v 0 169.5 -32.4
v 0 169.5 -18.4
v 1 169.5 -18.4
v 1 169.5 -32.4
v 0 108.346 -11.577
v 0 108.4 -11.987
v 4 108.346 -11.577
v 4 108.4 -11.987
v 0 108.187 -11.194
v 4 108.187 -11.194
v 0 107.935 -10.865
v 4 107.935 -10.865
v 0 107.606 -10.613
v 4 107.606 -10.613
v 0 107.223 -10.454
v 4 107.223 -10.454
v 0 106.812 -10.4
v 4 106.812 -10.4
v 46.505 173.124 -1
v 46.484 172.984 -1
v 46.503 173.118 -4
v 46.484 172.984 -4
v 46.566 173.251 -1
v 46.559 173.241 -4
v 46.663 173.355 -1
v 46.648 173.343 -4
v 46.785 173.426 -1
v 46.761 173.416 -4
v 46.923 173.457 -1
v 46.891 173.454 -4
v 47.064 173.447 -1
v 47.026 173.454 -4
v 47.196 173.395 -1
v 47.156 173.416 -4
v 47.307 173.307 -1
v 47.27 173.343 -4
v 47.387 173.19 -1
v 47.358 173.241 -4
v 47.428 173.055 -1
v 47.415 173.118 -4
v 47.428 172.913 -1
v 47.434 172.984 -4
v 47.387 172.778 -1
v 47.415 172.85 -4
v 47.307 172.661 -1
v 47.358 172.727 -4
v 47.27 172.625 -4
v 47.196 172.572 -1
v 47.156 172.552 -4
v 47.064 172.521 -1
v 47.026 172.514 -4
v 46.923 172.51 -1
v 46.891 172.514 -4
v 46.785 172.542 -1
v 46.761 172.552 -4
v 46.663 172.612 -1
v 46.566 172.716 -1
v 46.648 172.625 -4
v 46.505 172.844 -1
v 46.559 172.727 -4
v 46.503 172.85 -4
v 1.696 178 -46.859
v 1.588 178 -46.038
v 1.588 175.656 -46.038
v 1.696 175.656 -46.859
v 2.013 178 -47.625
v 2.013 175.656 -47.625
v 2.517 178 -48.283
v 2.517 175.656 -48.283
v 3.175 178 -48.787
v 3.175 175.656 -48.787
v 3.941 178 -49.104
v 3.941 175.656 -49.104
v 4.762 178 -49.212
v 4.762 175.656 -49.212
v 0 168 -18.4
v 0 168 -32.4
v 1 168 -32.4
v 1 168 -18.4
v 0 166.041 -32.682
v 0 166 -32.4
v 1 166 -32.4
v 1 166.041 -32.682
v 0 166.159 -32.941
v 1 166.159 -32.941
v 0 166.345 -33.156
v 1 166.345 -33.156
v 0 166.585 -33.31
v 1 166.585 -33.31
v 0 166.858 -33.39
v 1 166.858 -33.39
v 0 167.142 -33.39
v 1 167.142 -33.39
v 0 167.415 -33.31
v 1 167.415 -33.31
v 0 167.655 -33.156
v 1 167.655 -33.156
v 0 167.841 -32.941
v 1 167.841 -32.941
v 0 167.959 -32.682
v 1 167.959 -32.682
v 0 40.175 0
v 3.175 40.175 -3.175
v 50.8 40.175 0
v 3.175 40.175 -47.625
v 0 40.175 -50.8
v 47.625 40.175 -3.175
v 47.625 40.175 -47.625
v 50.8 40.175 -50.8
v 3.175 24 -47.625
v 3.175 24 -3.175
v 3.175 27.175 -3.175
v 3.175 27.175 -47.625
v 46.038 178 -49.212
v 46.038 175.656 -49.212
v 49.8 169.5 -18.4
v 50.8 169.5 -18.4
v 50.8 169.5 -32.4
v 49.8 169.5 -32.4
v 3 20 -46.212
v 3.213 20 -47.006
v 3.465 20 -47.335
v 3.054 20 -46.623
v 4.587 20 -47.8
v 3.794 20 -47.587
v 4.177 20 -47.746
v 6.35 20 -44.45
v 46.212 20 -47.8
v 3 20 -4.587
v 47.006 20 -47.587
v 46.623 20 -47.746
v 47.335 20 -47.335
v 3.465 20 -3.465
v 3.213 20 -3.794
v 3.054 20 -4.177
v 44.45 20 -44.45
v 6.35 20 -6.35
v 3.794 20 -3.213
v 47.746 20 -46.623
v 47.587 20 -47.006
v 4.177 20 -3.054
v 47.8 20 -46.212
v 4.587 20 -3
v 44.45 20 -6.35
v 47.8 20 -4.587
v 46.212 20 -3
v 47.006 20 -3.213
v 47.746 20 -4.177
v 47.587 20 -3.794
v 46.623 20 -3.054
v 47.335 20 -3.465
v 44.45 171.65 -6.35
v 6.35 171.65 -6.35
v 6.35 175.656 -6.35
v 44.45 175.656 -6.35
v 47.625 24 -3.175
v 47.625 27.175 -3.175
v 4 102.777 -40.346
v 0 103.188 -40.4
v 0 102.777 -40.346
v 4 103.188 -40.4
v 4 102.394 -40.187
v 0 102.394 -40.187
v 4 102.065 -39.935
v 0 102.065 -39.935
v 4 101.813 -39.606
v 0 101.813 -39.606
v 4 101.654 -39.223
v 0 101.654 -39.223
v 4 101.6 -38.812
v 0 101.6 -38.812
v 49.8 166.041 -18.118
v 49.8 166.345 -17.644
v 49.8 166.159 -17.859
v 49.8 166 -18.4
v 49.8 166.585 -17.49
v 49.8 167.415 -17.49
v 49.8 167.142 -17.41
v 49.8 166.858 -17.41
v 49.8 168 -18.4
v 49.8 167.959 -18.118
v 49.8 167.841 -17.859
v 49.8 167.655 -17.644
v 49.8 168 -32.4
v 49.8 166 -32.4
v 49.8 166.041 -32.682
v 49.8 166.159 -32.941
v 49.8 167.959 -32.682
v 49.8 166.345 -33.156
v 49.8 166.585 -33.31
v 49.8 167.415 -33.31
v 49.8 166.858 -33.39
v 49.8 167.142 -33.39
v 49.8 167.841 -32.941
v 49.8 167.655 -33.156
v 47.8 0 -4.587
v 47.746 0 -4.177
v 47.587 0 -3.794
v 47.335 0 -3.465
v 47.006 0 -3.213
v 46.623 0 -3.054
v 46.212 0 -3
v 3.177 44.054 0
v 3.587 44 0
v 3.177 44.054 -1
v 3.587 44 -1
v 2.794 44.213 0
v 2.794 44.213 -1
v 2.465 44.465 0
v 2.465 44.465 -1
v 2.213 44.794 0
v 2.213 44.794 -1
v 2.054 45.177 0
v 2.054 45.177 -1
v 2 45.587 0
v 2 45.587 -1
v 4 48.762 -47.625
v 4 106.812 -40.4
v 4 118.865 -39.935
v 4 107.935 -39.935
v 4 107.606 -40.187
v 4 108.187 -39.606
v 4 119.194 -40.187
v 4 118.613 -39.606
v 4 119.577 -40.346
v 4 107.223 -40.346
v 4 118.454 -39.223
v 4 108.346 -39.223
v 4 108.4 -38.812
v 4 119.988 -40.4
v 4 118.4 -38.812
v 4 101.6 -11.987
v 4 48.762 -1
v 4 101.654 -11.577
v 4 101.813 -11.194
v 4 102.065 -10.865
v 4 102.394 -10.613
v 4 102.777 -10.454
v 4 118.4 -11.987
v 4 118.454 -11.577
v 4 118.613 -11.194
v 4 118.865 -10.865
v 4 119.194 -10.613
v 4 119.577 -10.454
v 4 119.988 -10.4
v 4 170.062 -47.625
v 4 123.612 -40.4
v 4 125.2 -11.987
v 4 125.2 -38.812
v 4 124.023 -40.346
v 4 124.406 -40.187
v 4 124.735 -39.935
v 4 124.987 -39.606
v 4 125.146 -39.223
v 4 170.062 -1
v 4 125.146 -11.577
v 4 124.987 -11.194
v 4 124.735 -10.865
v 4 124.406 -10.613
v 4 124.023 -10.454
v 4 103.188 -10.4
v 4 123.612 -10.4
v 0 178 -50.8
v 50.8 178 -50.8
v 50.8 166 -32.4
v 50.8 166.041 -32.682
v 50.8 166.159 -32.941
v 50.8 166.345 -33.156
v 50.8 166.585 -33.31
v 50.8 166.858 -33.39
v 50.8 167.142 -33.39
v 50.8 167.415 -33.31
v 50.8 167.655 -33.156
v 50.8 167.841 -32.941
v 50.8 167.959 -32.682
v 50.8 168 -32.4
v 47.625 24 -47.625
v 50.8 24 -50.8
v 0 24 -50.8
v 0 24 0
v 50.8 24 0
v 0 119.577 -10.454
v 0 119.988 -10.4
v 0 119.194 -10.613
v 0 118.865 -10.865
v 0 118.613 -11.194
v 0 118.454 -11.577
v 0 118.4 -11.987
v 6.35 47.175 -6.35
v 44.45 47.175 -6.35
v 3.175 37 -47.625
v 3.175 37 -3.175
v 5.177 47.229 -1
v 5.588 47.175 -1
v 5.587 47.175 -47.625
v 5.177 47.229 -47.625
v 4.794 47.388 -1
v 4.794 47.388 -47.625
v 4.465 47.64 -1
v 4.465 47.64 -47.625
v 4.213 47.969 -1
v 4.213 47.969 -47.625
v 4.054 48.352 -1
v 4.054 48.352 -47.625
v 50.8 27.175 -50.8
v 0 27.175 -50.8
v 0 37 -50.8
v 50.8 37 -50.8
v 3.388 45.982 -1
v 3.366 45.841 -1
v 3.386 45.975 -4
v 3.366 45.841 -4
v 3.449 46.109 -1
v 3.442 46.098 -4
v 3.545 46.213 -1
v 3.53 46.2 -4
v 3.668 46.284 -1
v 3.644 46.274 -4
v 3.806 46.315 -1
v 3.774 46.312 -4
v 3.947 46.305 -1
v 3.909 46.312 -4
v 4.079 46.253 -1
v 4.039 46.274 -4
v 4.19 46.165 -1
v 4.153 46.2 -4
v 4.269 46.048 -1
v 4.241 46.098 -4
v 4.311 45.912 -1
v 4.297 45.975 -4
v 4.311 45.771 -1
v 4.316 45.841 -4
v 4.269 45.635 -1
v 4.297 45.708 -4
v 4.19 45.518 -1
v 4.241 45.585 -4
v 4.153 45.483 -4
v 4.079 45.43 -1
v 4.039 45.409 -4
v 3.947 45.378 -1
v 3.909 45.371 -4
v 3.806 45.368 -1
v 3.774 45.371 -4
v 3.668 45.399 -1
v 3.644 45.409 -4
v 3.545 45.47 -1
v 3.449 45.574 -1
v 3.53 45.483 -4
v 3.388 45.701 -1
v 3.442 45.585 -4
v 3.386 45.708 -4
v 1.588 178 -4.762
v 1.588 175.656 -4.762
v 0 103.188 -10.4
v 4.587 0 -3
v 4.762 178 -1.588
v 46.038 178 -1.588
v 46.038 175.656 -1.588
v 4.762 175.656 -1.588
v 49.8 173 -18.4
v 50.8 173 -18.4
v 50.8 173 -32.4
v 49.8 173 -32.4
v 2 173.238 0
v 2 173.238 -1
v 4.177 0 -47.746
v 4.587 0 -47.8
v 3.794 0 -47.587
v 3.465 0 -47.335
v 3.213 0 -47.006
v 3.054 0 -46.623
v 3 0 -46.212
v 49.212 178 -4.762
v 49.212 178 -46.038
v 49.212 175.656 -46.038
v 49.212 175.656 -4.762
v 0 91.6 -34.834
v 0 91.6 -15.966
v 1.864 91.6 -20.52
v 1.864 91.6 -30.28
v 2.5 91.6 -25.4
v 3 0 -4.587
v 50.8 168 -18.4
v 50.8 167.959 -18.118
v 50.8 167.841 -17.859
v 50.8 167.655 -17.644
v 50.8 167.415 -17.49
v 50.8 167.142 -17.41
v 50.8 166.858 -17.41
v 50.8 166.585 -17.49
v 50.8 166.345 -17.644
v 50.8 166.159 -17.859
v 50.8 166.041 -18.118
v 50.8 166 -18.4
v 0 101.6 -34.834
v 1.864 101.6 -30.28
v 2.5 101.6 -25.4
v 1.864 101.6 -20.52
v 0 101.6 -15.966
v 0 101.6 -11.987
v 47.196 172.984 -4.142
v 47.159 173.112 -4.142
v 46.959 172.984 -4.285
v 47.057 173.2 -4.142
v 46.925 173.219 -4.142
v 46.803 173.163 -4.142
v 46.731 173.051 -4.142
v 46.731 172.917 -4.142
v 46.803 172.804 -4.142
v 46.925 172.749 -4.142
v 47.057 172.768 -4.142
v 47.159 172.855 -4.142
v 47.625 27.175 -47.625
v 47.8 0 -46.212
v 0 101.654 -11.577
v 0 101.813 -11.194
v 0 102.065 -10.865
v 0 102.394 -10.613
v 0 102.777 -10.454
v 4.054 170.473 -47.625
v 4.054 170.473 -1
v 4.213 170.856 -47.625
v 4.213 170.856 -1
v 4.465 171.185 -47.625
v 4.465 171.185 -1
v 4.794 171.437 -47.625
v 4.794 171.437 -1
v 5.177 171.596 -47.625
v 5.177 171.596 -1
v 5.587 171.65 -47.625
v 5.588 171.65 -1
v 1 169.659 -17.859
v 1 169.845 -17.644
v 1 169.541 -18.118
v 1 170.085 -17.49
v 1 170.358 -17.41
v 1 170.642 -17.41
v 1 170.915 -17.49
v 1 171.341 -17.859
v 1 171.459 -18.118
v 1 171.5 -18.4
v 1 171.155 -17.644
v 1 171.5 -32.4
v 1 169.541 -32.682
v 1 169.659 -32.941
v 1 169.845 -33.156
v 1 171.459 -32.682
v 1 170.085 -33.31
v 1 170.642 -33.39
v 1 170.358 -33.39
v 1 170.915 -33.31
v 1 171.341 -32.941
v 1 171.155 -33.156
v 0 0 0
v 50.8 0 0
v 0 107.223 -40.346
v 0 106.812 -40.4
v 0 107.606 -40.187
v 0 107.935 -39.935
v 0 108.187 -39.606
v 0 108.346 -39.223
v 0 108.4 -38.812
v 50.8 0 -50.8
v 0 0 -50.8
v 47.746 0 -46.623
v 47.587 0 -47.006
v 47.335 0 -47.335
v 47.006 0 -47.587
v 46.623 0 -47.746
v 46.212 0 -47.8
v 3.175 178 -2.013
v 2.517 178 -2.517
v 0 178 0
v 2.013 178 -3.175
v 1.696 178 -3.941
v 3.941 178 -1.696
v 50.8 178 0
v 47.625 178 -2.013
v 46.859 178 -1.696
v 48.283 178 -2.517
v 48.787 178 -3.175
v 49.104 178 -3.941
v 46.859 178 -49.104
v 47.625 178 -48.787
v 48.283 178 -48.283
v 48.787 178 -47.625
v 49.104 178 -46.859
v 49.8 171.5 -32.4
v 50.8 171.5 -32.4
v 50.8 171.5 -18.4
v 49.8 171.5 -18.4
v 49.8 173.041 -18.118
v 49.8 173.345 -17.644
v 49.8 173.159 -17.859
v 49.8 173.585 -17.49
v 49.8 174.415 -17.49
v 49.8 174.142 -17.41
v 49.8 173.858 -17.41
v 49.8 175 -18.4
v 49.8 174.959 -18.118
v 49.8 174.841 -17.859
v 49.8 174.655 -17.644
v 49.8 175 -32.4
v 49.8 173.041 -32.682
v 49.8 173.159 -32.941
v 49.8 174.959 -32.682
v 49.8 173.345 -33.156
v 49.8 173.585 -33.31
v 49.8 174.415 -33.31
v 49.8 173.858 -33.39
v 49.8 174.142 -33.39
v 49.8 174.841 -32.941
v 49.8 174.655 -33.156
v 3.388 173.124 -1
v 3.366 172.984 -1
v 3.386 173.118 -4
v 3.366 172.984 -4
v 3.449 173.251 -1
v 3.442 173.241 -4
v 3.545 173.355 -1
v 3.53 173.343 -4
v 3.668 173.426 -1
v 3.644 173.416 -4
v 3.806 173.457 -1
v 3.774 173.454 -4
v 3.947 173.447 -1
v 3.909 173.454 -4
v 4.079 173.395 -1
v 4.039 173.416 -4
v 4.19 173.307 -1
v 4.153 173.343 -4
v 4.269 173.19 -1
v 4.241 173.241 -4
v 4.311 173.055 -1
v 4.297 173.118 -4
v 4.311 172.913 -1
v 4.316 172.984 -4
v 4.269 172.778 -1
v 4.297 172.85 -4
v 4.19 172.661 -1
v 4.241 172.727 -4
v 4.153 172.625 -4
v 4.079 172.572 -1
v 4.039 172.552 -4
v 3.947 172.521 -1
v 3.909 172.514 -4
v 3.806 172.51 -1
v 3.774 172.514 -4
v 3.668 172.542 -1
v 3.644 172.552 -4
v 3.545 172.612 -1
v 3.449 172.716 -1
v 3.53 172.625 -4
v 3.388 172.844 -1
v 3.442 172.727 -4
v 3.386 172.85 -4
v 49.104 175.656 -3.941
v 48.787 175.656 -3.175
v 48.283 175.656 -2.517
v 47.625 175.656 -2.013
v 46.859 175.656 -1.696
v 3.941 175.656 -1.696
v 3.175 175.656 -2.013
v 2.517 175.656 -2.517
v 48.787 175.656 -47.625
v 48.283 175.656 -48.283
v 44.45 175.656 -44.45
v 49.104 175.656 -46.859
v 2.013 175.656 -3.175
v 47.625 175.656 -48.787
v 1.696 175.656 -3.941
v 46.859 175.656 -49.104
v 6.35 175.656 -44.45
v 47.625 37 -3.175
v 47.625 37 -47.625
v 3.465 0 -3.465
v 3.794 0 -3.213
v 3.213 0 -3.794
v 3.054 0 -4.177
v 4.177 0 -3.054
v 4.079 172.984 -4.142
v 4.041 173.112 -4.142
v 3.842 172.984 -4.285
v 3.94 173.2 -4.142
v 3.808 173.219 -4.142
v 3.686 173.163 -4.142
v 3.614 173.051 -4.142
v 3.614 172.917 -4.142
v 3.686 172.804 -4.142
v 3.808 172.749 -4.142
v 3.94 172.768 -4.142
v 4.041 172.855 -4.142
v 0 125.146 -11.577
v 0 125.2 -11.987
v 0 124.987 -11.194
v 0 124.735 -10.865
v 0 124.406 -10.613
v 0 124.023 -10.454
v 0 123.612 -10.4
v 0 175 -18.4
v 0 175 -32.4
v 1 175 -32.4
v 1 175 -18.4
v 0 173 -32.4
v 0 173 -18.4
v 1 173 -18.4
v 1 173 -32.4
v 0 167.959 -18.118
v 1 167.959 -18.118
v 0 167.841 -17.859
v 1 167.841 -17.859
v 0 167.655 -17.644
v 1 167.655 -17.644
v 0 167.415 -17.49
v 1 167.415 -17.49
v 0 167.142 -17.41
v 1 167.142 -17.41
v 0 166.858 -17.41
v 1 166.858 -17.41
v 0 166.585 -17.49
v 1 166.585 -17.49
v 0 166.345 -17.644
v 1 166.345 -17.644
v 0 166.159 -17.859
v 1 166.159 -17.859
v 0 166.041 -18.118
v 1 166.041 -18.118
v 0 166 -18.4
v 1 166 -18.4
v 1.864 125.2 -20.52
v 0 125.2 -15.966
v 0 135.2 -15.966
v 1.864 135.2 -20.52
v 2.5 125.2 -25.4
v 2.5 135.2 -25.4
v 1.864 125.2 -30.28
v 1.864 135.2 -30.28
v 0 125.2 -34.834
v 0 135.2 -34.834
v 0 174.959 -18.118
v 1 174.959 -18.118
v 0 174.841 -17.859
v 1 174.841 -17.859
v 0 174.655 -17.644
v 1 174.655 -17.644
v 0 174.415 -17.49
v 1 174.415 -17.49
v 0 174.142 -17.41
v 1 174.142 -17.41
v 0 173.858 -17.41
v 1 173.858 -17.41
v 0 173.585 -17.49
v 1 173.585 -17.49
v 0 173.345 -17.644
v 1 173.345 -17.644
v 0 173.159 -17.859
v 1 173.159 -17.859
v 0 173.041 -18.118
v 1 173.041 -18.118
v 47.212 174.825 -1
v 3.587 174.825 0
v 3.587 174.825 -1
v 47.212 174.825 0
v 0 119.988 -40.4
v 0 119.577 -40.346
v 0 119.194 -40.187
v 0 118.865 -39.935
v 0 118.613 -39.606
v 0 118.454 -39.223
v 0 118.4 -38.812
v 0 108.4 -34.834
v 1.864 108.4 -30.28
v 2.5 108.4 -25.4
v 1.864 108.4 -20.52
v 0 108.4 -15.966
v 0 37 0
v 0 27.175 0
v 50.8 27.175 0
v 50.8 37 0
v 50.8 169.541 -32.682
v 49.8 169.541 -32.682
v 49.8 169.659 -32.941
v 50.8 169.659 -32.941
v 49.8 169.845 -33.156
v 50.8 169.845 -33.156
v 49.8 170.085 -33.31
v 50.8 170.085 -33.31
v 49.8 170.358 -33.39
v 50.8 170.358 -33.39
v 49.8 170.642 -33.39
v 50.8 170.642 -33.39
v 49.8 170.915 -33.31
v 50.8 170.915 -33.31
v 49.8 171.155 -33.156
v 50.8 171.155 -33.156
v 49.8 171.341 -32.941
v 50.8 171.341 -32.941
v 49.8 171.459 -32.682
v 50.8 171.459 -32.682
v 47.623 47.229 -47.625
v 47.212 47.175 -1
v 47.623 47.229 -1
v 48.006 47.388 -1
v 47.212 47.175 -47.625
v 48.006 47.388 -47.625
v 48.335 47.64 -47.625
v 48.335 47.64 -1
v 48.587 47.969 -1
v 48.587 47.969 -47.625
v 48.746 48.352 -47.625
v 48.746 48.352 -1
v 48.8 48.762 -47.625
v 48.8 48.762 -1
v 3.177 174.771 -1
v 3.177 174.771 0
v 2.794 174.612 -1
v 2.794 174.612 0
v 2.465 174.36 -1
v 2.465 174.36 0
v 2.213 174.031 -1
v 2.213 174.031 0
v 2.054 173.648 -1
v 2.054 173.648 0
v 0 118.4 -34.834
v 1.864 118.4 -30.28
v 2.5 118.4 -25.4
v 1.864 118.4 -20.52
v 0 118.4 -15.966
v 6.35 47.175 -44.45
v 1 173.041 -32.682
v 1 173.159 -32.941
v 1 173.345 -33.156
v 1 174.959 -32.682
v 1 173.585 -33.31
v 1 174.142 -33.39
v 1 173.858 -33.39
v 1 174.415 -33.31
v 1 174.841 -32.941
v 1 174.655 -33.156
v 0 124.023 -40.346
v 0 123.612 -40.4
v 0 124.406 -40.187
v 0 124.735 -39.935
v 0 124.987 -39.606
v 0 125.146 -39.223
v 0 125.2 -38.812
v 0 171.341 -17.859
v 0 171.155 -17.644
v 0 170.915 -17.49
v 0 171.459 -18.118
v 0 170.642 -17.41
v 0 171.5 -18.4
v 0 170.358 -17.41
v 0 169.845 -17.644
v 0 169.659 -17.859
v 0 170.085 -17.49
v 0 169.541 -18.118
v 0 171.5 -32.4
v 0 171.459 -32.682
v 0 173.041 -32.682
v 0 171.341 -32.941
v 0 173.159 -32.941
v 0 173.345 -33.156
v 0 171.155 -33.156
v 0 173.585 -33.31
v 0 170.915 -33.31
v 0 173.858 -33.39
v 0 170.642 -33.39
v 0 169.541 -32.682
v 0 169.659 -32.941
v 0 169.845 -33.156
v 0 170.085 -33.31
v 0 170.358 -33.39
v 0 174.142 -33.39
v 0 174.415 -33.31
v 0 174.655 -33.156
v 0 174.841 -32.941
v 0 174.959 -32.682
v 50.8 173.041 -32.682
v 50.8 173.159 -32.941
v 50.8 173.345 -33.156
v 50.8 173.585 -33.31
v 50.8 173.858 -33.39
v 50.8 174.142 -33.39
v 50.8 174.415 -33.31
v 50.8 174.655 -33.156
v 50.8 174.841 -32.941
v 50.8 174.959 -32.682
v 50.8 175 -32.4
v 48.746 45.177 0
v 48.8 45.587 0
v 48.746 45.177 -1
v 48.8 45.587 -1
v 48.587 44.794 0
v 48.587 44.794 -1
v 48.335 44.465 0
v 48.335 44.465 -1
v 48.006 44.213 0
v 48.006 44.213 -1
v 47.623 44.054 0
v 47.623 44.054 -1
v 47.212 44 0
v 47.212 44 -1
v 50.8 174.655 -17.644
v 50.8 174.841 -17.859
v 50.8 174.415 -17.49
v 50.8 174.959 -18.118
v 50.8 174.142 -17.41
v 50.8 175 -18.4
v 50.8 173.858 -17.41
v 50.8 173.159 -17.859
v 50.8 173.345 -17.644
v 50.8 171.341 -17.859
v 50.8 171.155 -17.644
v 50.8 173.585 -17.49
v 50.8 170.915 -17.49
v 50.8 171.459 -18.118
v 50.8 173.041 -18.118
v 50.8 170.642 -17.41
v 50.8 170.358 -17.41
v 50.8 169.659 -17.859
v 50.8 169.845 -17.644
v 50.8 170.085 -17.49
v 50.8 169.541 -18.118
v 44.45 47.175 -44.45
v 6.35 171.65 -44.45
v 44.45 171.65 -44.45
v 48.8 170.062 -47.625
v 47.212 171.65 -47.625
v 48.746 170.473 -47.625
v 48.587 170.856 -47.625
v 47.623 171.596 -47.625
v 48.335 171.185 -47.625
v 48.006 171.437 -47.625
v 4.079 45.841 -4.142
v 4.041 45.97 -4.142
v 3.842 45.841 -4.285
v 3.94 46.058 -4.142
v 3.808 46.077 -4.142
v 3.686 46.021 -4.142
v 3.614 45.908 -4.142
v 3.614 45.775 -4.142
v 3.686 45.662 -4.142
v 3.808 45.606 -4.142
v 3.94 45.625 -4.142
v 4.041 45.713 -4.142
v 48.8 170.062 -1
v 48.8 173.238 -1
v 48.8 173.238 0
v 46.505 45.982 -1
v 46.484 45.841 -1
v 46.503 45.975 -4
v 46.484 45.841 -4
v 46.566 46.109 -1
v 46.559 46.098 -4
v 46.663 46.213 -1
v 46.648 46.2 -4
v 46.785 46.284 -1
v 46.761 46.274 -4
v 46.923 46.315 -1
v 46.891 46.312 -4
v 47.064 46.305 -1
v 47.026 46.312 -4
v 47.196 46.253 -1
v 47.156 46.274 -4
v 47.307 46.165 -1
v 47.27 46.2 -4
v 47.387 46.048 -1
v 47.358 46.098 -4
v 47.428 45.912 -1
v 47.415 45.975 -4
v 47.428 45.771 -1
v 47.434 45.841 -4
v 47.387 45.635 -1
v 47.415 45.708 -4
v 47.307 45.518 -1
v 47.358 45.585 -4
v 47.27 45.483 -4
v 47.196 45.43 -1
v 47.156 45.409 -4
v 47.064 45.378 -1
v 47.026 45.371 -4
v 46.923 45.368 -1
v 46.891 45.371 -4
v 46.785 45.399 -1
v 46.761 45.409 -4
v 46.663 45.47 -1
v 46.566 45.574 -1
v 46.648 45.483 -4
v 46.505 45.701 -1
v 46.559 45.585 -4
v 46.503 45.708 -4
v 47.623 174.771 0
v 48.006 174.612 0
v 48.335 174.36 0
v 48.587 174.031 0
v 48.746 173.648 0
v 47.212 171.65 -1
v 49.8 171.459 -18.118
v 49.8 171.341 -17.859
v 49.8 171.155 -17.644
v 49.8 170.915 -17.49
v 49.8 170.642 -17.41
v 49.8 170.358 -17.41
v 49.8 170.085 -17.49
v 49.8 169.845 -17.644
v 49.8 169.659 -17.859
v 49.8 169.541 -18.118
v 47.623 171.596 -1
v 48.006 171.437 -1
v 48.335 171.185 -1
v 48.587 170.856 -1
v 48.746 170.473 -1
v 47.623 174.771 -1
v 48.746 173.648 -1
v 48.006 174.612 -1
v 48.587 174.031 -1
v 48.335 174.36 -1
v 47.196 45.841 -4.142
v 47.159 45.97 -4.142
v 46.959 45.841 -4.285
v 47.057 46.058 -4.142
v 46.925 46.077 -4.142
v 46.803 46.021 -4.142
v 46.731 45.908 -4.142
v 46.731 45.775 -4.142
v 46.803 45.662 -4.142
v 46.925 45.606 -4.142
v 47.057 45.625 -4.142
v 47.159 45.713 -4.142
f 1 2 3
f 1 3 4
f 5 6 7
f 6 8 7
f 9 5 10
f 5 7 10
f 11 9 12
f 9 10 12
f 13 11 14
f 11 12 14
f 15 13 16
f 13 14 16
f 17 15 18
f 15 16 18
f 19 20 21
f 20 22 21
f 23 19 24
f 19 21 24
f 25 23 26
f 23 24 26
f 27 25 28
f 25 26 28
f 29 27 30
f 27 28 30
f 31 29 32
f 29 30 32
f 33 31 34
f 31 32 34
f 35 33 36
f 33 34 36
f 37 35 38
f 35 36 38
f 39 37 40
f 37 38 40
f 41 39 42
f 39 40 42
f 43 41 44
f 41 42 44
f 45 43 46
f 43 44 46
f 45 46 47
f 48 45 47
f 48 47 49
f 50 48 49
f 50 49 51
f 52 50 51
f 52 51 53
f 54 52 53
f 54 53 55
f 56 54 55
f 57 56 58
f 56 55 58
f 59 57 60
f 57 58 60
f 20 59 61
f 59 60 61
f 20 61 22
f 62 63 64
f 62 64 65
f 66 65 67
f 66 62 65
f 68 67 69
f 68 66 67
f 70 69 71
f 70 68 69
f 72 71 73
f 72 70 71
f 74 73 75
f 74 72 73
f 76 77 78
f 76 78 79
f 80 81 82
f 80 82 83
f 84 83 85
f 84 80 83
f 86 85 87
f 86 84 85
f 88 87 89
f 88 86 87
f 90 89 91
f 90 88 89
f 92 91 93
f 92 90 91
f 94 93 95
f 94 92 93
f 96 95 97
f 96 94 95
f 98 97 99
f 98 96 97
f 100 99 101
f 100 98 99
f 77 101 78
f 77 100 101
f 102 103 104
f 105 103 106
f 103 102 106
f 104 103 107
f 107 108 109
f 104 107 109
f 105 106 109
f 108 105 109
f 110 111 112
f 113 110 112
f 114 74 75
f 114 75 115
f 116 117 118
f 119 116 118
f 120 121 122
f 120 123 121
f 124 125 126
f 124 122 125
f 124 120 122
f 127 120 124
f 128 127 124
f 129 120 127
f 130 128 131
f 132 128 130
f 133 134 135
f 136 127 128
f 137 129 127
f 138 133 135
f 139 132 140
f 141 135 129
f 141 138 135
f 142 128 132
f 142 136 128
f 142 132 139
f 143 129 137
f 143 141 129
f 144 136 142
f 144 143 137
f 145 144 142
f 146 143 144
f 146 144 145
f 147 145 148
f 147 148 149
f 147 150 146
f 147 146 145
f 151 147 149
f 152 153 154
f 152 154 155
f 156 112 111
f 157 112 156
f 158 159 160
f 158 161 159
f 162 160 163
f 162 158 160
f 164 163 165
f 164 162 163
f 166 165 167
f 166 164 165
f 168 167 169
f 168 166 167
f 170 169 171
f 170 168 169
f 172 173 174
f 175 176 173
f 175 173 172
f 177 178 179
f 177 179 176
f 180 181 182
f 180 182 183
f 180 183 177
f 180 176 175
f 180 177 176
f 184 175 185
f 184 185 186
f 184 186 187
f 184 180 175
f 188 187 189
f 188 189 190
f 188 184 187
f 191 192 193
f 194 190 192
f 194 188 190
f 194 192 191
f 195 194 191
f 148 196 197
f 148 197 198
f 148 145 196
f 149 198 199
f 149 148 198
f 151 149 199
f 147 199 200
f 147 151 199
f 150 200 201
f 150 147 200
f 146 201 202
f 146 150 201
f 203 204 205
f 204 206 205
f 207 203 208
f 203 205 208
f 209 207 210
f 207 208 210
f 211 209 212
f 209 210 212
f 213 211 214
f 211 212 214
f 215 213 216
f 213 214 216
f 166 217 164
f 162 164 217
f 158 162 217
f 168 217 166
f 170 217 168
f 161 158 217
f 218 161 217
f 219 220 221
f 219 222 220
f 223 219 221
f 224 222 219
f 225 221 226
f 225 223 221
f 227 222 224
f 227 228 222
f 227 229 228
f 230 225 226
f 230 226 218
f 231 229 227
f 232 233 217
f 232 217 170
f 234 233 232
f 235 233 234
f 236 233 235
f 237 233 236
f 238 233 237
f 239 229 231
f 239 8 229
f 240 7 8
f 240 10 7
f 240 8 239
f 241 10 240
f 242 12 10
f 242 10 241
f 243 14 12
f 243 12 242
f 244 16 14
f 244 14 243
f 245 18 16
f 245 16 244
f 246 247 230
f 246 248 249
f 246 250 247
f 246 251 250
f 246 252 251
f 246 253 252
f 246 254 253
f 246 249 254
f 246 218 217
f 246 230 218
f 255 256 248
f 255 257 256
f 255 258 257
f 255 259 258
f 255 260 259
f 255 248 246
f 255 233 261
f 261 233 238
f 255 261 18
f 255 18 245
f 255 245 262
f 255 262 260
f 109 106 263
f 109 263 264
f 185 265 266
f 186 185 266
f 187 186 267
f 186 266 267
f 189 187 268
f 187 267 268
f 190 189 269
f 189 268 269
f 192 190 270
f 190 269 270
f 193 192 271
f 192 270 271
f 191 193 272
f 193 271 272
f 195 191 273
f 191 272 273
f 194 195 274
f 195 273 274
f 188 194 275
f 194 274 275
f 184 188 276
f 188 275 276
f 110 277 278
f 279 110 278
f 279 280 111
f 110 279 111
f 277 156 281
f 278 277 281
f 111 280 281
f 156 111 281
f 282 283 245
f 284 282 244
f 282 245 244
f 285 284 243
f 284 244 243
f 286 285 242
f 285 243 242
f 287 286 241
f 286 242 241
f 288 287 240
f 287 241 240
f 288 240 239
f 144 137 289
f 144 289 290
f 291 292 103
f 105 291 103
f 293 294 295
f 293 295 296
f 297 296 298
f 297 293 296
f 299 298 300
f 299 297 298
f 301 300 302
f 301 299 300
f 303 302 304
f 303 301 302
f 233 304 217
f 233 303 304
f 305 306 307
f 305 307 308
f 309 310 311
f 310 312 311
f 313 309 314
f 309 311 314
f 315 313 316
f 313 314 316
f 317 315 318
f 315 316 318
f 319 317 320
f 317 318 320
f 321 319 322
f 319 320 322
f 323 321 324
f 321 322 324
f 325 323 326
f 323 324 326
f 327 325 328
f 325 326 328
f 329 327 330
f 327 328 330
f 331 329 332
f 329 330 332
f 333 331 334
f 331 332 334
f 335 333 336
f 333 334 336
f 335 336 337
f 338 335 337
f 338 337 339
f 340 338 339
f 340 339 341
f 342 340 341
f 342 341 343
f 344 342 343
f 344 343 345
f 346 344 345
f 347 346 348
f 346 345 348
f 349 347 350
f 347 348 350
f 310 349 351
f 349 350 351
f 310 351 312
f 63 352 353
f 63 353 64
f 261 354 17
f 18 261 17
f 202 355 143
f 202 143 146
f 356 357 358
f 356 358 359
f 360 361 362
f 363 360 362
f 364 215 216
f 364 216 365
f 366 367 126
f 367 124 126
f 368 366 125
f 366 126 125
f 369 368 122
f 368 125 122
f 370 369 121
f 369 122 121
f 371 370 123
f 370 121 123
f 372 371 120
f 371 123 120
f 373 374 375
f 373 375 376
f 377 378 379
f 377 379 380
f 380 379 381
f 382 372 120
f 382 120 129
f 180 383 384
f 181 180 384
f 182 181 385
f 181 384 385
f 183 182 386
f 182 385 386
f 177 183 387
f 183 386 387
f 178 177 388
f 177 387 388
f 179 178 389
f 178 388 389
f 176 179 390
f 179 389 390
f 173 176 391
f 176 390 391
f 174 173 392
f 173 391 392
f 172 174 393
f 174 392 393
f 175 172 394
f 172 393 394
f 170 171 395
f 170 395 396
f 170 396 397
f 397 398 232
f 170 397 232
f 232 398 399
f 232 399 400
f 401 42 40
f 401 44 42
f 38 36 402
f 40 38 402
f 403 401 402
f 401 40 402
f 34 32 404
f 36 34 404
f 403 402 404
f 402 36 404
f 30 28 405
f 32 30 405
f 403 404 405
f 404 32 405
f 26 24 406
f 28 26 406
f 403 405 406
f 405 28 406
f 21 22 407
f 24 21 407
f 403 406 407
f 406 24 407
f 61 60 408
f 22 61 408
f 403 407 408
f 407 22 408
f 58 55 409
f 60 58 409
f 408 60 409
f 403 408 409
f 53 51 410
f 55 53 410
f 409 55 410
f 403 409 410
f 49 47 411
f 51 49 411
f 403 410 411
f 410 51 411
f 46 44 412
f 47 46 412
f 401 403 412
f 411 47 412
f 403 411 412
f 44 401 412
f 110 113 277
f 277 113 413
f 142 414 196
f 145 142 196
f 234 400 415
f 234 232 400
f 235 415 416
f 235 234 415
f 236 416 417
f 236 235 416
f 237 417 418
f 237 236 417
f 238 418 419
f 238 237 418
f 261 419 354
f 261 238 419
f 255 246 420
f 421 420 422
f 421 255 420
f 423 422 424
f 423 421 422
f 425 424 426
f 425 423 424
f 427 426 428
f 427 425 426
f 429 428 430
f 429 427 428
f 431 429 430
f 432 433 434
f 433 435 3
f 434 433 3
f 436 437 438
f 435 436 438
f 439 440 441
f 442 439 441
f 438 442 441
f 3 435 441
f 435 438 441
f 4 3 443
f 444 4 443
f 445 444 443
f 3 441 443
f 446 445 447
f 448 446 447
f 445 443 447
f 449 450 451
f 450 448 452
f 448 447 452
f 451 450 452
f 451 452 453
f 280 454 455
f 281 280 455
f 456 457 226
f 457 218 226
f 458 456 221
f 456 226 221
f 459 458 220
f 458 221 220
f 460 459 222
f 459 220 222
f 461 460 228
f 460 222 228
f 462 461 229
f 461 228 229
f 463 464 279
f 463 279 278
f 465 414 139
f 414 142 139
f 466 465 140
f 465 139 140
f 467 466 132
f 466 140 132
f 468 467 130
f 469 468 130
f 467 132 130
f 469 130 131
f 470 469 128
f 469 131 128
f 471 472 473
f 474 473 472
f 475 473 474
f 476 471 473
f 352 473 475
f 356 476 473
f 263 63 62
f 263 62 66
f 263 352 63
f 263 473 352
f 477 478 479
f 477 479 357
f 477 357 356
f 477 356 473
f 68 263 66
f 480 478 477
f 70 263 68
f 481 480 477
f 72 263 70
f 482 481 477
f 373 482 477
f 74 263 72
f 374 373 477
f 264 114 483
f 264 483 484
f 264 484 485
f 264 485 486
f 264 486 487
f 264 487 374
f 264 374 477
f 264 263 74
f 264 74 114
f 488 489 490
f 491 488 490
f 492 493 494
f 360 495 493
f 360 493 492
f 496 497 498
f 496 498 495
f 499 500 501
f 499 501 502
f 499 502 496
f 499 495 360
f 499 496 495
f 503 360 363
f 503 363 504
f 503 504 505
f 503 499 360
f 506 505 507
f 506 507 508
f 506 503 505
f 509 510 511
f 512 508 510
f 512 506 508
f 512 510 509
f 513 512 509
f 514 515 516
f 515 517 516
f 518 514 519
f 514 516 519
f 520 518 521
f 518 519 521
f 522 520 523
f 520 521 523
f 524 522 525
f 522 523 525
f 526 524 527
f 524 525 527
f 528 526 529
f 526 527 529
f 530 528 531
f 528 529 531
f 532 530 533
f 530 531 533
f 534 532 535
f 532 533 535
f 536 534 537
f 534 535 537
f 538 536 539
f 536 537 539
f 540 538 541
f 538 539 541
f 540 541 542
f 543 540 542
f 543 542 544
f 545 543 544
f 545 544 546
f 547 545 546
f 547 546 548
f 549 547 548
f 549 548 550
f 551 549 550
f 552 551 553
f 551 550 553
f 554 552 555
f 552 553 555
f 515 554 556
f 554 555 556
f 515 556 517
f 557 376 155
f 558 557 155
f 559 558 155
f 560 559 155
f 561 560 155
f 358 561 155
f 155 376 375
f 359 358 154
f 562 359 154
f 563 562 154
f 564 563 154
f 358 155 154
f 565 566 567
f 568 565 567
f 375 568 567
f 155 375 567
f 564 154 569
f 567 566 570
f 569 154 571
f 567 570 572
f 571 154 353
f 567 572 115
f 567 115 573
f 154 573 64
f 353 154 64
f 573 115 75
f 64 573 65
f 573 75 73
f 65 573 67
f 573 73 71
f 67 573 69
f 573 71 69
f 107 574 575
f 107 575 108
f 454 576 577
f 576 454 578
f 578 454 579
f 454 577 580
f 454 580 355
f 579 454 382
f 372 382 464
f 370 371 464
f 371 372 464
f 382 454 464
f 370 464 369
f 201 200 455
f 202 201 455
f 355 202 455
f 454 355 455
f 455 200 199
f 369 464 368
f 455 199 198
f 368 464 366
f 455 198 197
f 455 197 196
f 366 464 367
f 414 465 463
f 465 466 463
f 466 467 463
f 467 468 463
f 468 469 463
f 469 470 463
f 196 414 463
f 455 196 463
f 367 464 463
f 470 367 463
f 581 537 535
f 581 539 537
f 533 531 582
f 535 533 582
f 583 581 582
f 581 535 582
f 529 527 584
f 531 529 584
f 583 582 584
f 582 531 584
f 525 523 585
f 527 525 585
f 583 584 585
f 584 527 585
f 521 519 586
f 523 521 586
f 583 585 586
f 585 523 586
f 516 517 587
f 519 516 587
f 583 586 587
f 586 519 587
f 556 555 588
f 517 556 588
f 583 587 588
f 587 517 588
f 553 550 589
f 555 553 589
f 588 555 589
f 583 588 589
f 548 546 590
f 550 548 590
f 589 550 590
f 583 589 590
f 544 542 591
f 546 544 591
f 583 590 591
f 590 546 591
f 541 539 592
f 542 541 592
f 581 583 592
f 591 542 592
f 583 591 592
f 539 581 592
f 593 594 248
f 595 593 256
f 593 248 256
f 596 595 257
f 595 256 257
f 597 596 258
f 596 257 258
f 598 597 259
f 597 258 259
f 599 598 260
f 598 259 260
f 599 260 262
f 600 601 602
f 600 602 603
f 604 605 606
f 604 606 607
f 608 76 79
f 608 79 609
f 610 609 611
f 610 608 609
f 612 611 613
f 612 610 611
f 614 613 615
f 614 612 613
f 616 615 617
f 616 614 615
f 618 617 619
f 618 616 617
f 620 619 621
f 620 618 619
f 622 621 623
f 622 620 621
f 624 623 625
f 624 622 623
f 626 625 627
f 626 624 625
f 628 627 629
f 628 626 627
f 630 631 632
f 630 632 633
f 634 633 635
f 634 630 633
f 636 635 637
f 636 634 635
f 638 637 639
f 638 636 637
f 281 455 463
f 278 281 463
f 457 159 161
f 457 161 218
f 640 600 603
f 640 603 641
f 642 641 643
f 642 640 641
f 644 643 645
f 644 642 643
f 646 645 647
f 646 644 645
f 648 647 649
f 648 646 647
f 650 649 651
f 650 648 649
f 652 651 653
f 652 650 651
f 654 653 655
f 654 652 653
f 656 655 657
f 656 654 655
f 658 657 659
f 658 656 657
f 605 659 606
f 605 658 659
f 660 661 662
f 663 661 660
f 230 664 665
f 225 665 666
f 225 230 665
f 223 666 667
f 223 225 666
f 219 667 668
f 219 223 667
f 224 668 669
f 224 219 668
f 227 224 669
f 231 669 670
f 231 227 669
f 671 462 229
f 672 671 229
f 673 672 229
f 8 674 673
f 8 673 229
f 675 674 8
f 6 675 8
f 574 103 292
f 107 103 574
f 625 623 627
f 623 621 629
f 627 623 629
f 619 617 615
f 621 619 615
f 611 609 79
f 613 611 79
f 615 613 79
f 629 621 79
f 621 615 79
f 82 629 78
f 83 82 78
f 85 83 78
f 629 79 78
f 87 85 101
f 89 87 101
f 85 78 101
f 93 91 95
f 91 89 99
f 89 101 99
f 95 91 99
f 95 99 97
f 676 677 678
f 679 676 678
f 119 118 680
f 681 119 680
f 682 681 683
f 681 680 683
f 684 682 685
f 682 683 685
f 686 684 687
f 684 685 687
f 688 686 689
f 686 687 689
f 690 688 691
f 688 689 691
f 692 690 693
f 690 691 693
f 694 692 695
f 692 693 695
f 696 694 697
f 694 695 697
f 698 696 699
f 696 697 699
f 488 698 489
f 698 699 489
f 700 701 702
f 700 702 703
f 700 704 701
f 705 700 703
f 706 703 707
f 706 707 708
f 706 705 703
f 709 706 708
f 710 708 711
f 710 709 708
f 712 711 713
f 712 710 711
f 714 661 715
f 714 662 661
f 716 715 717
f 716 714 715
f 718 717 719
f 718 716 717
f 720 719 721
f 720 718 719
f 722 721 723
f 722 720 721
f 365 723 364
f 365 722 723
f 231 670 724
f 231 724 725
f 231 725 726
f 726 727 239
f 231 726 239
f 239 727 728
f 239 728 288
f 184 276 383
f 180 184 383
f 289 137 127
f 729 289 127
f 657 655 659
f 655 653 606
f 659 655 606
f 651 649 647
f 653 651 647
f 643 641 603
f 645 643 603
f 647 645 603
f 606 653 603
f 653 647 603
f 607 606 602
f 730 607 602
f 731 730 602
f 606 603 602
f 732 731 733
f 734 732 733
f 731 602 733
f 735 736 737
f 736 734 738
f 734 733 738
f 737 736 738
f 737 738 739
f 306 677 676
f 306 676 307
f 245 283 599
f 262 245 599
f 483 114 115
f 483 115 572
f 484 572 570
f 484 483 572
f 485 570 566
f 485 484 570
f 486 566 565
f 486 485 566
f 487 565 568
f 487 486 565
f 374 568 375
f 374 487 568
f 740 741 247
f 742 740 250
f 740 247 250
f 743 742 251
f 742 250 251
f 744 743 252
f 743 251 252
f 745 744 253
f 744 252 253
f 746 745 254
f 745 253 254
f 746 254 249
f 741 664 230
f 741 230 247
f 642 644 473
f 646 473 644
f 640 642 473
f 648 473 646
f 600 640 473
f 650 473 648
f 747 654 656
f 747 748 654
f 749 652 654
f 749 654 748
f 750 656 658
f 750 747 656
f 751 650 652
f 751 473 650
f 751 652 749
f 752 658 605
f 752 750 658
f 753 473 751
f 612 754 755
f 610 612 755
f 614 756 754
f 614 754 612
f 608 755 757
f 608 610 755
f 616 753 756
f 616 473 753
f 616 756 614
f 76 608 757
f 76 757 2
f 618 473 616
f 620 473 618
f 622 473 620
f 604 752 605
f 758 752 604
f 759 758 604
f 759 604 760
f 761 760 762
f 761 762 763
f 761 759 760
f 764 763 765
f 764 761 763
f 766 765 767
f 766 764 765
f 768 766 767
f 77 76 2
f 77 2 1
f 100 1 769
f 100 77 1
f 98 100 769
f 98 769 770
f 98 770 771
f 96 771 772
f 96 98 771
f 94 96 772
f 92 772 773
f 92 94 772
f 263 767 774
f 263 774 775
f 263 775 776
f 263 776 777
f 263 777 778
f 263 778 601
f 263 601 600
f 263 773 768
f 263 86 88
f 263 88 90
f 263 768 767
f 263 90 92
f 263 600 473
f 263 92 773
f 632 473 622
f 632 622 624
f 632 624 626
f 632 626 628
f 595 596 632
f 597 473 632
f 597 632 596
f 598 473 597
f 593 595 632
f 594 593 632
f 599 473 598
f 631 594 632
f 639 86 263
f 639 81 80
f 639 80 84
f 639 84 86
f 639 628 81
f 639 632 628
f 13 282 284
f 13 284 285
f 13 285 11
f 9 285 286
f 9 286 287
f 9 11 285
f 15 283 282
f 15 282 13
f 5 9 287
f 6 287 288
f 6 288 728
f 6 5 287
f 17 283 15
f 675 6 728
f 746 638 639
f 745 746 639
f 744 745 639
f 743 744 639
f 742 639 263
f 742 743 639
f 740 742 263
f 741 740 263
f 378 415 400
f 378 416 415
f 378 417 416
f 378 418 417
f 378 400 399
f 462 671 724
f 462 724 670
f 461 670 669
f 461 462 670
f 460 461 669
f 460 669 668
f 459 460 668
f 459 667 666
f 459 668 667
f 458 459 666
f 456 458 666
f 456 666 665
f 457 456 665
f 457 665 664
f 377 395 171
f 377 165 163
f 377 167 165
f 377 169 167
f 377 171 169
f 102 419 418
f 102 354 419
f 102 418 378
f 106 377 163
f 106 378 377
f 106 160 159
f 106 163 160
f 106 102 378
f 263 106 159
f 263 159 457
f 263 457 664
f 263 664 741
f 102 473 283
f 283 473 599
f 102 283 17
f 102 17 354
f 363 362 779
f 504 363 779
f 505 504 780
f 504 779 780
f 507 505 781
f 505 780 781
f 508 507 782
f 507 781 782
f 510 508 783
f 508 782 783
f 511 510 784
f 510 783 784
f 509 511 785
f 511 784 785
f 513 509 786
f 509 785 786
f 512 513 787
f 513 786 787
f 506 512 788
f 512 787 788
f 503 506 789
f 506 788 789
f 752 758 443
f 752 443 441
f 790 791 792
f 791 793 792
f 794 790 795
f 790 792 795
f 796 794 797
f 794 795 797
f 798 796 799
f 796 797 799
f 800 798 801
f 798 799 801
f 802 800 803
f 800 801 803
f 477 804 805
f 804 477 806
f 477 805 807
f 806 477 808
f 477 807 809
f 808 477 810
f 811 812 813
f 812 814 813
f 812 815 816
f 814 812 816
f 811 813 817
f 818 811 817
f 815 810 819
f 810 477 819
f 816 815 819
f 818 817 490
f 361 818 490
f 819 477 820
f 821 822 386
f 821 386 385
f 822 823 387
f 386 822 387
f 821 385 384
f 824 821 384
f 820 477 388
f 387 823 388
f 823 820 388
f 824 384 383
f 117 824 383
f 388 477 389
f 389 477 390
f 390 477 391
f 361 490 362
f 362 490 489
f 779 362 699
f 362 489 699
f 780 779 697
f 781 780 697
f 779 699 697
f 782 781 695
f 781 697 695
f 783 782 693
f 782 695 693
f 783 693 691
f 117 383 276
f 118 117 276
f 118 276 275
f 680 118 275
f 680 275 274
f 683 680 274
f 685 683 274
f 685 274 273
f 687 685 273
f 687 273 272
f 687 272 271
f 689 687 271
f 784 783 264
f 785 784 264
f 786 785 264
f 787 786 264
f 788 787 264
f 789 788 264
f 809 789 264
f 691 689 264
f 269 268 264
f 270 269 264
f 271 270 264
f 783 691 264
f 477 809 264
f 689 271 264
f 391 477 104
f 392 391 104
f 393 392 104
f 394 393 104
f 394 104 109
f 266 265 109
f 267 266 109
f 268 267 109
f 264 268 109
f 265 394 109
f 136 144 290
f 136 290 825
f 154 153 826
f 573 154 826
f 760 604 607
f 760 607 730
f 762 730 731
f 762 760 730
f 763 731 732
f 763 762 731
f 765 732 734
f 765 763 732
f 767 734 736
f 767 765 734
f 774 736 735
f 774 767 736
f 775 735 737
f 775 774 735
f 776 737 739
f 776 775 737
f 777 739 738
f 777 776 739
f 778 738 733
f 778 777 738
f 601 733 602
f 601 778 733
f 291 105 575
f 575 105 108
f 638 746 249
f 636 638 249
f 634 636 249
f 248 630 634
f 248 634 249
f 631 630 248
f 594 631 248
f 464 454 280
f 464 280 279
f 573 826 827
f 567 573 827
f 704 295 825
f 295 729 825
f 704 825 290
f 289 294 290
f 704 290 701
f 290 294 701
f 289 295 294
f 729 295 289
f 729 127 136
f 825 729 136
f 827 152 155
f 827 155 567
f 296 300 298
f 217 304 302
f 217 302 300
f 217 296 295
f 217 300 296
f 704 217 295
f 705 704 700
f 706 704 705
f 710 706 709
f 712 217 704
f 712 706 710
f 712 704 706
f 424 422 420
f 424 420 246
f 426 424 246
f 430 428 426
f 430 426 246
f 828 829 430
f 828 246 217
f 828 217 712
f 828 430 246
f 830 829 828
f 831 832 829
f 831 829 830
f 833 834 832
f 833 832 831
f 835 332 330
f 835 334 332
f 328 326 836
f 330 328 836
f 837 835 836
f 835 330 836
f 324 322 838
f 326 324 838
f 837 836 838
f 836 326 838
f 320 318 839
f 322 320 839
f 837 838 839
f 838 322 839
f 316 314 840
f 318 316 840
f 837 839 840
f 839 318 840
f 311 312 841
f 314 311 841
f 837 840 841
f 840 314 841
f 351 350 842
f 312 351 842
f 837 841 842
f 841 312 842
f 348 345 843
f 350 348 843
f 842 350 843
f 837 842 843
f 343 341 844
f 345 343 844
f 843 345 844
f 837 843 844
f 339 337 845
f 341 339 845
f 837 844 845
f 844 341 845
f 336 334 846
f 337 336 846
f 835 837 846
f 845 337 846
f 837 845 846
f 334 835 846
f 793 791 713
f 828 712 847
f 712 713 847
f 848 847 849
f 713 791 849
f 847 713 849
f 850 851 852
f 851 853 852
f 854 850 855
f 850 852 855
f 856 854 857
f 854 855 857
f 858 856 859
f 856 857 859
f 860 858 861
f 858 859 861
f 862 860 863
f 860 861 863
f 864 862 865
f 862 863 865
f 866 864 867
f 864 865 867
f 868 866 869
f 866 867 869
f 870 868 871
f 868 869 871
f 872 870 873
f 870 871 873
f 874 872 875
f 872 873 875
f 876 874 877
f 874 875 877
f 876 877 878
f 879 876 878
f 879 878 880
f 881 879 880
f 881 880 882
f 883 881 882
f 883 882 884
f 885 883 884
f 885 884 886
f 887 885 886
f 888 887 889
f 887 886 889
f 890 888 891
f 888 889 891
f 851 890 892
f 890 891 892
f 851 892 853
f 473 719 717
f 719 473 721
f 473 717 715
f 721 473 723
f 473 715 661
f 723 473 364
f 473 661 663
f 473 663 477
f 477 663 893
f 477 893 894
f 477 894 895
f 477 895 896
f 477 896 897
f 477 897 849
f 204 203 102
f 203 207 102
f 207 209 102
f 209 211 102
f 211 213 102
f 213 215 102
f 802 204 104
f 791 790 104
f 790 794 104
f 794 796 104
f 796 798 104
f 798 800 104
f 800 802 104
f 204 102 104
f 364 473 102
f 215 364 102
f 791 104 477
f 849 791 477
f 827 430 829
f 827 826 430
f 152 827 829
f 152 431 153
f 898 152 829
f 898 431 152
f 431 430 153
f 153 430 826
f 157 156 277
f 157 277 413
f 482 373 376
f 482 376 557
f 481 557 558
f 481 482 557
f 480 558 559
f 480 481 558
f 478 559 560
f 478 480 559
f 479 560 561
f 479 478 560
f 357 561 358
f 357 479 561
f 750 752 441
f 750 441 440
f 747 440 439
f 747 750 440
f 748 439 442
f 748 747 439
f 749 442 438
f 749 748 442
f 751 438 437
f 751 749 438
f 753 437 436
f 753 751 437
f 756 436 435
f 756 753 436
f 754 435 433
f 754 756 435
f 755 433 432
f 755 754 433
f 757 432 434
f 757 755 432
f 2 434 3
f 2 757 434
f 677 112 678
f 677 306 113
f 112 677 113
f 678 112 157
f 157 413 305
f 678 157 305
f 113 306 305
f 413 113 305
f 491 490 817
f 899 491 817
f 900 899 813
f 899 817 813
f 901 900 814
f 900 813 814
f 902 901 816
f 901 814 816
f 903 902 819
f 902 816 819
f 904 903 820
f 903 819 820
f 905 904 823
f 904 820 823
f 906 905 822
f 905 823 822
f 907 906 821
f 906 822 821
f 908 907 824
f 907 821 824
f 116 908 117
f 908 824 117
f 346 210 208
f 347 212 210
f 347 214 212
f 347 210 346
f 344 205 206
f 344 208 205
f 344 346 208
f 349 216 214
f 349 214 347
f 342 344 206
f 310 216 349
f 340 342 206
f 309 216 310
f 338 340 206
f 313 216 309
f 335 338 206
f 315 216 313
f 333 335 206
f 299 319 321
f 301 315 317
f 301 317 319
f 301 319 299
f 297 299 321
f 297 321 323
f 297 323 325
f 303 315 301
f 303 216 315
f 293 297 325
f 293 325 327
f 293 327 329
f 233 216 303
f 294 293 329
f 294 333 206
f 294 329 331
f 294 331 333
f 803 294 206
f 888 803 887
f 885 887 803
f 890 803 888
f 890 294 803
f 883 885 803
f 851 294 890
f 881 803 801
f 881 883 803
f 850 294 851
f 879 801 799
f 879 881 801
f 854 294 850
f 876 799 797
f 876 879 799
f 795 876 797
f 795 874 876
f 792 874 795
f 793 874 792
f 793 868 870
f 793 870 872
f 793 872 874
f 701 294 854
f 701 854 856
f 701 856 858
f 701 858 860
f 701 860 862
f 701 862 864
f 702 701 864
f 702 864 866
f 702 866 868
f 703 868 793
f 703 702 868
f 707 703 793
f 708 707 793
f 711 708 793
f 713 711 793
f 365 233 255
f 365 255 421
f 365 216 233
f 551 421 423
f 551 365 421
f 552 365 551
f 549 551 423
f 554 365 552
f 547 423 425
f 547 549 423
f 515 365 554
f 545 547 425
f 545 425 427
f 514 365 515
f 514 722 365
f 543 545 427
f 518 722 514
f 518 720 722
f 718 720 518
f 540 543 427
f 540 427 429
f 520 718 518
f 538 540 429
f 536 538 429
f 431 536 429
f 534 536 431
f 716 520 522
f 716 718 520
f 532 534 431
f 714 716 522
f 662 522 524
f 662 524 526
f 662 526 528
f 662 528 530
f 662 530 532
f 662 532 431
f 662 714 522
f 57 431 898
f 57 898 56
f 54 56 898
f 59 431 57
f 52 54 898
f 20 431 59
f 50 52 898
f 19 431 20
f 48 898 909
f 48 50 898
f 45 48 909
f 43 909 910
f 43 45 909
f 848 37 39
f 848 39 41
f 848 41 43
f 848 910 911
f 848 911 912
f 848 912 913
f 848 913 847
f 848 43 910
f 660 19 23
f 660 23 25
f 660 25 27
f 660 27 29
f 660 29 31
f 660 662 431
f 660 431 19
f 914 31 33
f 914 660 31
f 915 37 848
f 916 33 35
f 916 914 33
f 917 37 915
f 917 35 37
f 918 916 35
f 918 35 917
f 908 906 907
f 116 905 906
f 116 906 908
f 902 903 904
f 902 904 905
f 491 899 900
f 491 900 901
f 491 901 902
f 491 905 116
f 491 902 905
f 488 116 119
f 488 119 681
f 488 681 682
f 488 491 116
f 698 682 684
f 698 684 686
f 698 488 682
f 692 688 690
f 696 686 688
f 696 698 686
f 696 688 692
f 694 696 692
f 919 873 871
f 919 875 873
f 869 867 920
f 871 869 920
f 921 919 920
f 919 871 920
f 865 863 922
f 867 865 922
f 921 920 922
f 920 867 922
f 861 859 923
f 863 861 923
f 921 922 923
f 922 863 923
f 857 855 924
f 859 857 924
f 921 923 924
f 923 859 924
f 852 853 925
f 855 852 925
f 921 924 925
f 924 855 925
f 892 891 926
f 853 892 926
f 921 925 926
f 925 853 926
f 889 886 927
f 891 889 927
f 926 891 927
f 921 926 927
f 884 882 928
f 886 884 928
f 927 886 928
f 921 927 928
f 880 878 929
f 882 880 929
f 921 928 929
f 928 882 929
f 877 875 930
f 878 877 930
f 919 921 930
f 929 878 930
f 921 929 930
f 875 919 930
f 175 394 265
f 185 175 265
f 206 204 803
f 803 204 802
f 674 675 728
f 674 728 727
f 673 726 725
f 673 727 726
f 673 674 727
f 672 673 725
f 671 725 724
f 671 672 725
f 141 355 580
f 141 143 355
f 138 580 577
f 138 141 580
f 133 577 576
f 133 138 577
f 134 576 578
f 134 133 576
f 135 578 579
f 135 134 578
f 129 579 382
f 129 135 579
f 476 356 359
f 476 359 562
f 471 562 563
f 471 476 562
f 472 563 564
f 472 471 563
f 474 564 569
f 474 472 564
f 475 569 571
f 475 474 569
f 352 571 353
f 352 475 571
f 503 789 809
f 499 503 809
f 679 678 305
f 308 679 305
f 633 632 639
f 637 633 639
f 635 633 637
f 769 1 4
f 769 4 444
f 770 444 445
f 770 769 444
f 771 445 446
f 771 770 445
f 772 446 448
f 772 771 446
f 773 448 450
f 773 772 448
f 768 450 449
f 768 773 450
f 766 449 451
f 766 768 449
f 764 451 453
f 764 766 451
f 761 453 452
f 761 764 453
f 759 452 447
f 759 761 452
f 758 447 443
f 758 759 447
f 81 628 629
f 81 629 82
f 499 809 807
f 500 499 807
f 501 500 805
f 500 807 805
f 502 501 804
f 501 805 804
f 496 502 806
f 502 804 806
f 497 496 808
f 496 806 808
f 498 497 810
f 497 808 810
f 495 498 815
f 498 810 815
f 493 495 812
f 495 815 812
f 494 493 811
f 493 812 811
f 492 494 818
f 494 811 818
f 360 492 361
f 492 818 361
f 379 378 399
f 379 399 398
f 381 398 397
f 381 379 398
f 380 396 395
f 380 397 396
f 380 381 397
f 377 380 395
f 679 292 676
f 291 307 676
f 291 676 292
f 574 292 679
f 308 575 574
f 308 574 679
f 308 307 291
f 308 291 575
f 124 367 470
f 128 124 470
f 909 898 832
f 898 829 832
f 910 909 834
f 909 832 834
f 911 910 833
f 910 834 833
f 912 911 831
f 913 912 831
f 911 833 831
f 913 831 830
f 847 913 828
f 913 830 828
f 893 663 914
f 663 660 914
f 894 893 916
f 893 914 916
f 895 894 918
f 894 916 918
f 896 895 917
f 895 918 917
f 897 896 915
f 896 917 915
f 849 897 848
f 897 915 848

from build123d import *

# Parameters (mm, degrees)
SKETCH1_W                    = 50.8
SKETCH1_H                    = 50.8
SKETCH1_W_2                  = 38.1
SKETCH1_H_2                  = 38.1
BOSS_EXTRUDE1_DEPTH          = 178
SKETCH2_W                    = 44.8
SKETCH2_H                    = 44.8
SKETCH2_W_2                  = 38.1
SKETCH2_H_2                  = 38.1
CUT_EXTRUDE1_DEPTH           = 20
SKETCH3_W                    = 46.8
SKETCH3_H                    = 124.475000116
CUT_EXTRUDE2_DEPTH           = 47.625
SKETCH4_W                    = 50.8
SKETCH4_H                    = 3.175
CUT_EXTRUDE3_DEPTH           = 3.175
SKETCH5_W                    = 3.175
SKETCH5_H                    = 3.175
CUT_EXTRUDE4_DEPTH           = 192.951243809
CUT_EXTRUDE5_DEPTH           = 1
SKETCH7_W                    = 46.8
SKETCH7_H                    = 3.175
CUT_EXTRUDE6_DEPTH           = 1
FILLET1_R                    = 1.5875
CUT_EXTRUDE7_DEPTH           = 2.34442
M1_2X0_25_TAPPED_HOLE1_D     = 0.95
M1_2X0_25_TAPPED_HOLE1_DEPTH = 2.9997
M1_2X0_25_TAPPED_HOLE1_TIP   = 0.285408794
BOSS_EXTRUDE2_REACH          = 193.689
CUT_EXTRUDE8_REACH           = 193.951
SKETCH15_W                   = 30
SKETCH15_H                   = 6.8
FILLET2_R                    = 1.5875
CUT_EXTRUDE9_DEPTH           = 21.8
CUT_EXTRUDE9_DEPTH_BACK      = 21.8
SKETCH20_R                   = 19.05


with BuildPart() as part:
    # Sketch1 → Boss-Extrude1 (new body)
    with BuildSketch(Plane(origin=(0, 0, 0), x_dir=(1, 0, 0), z_dir=(0, 1, 0))):
        with Locations((25.4, 25.4)):
            Rectangle(SKETCH1_W, SKETCH1_H)
        with Locations((25.4, 25.4)):
            Rectangle(SKETCH1_W_2, SKETCH1_H_2, mode=Mode.SUBTRACT)
    extrude(amount=BOSS_EXTRUDE1_DEPTH)

    # Sketch2 → Cut-Extrude1 (cut)
    with BuildSketch(Plane.XZ):
        with Locations((25.4, -25.4)):
            Rectangle(SKETCH2_W, SKETCH2_H)
        with Locations((25.4, -25.4)):
            Rectangle(SKETCH2_W_2, SKETCH2_H_2, mode=Mode.SUBTRACT)
    extrude(amount=-CUT_EXTRUDE1_DEPTH, mode=Mode.SUBTRACT)

    # Sketch3 → Cut-Extrude2 (cut)
    with BuildSketch(Plane.XY):
        with Locations((25.4, 109.412499942)):
            Rectangle(SKETCH3_W, SKETCH3_H)
    extrude(amount=-CUT_EXTRUDE2_DEPTH, mode=Mode.SUBTRACT)

    # Sketch4 → Cut-Extrude3 (cut)
    with BuildSketch(Plane.XY):
        with Locations((25.4, 25.5875)):
            Rectangle(SKETCH4_W, SKETCH4_H)
        with Locations((25.4, 38.5875)):
            Rectangle(SKETCH4_W, SKETCH4_H)
    cut_extrude3 = extrude(amount=-CUT_EXTRUDE3_DEPTH, mode=Mode.SUBTRACT)

    # Sketch5 → Cut-Extrude4 (cut, through all)
    with BuildSketch(Plane.XY):
        with Locations((1.5875, 38.5875)):
            Rectangle(SKETCH5_W, SKETCH5_H)
        with Locations((1.5875, 25.5875)):
            Rectangle(SKETCH5_W, SKETCH5_H)
    cut_extrude4 = extrude(amount=-CUT_EXTRUDE4_DEPTH, mode=Mode.SUBTRACT)

    # Sketch6 → Cut-Extrude5 (cut)
    with BuildSketch(Plane.ZY):
        with BuildLine():
            Line((-32.4, 175), (-18.4, 175))
            ThreePointArc((-18.4, 175), (-17.4, 174), (-18.4, 173))
            Line((-18.4, 173), (-32.4, 173))
            ThreePointArc((-32.4, 173), (-33.4, 174), (-32.4, 175))
        make_face()
        with BuildLine():
            Line((-32.4, 171.5), (-18.4, 171.5))
            ThreePointArc((-18.4, 171.5), (-17.4, 170.5), (-18.4, 169.5))
            Line((-18.4, 169.5), (-32.4, 169.5))
            ThreePointArc((-32.4, 169.5), (-33.4, 170.5), (-32.4, 171.5))
        make_face()
        with BuildLine():
            Line((-32.4, 168), (-18.4, 168))
            ThreePointArc((-18.4, 168), (-17.4, 167), (-18.4, 166))
            Line((-18.4, 166), (-32.4, 166))
            ThreePointArc((-32.4, 166), (-33.4, 167), (-32.4, 168))
        make_face()
    cut_extrude5 = extrude(amount=-CUT_EXTRUDE5_DEPTH, mode=Mode.SUBTRACT)

    # Mirror1: Cut-Extrude3 across plane
    add(cut_extrude3.mirror(Plane.XY.offset(-25.4)), mode=Mode.SUBTRACT)

    # Mirror2: Cut-Extrude4, Cut-Extrude5 across plane
    add(cut_extrude4.mirror(Plane.ZY.offset(-25.4)), mode=Mode.SUBTRACT)
    add(cut_extrude5.mirror(Plane.ZY.offset(-25.4)), mode=Mode.SUBTRACT)

    # Sketch7 → Cut-Extrude6 (cut)
    with BuildSketch(Plane.XY):
        with Locations((25.4, 173.2375)):
            Rectangle(SKETCH7_W, SKETCH7_H)
        with Locations((25.4, 45.587499884)):
            Rectangle(SKETCH7_W, SKETCH7_H)
    extrude(amount=-CUT_EXTRUDE6_DEPTH, mode=Mode.SUBTRACT)

    # Fillet1
    fillet1_edges = [part.edges().sort_by_distance(p)[0] for p in [
        (47.8, 10, -3),
        (47.8, 10, -47.8),
        (2, 174.825, -0.5),
        (48.8, 174.825, -0.5),
        (3, 10, -47.8),
        (2, 43.999999884, -0.5),
        (3, 10, -3),
        (48.8, 43.999999884, -0.5),
        (2, 47.174999884, -24.3125),
        (2, 171.65, -24.3125),
        (48.8, 171.65, -24.3125),
        (48.8, 47.174999884, -24.3125),
    ]]
    fillet(fillet1_edges, radius=FILLET1_R)

    # Sketch8 → Cut-Extrude7 (cut)
    with BuildSketch(Plane(origin=(0, 178, 0), x_dir=(1, 0, 0), z_dir=(0, 1, 0))):
        with BuildLine():
            Line((4.7625, 49.2125), (46.0375, 49.2125))
            ThreePointArc((46.0375, 49.2125), (48.28256403, 48.28256403), (49.2125, 46.0375))
            Line((49.2125, 46.0375), (49.2125, 4.7625))
            ThreePointArc((49.2125, 4.7625), (48.28256403, 2.51743597), (46.0375, 1.5875))
            Line((46.0375, 1.5875), (4.7625, 1.5875))
            ThreePointArc((4.7625, 1.5875), (2.51743597, 2.51743597), (1.5875, 4.7625))
            Line((1.5875, 4.7625), (1.5875, 46.0375))
            ThreePointArc((1.5875, 46.0375), (2.51743597, 48.28256403), (4.7625, 49.2125))
        make_face()
    extrude(amount=-CUT_EXTRUDE7_DEPTH, mode=Mode.SUBTRACT)

    # M1.2x0.25 Tapped Hole1
    with Locations(Plane.XY.offset(-1)):
        with Locations((3.8415, 172.98375321), (46.95875321, 172.98375321), (3.8415, 45.841499884), (46.95875321, 45.841499884)):
            Hole(M1_2X0_25_TAPPED_HOLE1_D / 2, depth=M1_2X0_25_TAPPED_HOLE1_DEPTH)
            with Locations((0, 0, -(M1_2X0_25_TAPPED_HOLE1_DEPTH + M1_2X0_25_TAPPED_HOLE1_TIP / 2))):  # 118° drill point
                Cone(0, M1_2X0_25_TAPPED_HOLE1_D / 2, M1_2X0_25_TAPPED_HOLE1_TIP, mode=Mode.SUBTRACT)

    # Sketch17 → Boss-Extrude2 (add, up to next)
    with BuildSketch(Plane.XY.offset(-1), mode=Mode.PRIVATE) as boss_extrude2_sk1:
        with BuildLine():
            Line((2, 170.0625), (2, 48.762499884))
            ThreePointArc((2, 48.762499884), (2.464967985, 47.639967869), (3.5875, 47.174999884))
            Line((3.5875, 47.174999884), (5.5875, 47.174999884))
            ThreePointArc((5.5875, 47.174999884), (4.464967985, 47.639967869), (4, 48.762499884))
            Line((4, 48.762499884), (4, 170.0625))
            ThreePointArc((4, 170.0625), (4.464967985, 171.185032015), (5.5875, 171.65))
            Line((5.5875, 171.65), (3.5875, 171.65))
            ThreePointArc((3.5875, 171.65), (2.464967985, 171.185032015), (2, 170.0625))
        make_face()
    boss_extrude2_tool1 = extrude(boss_extrude2_sk1.sketch, amount=-BOSS_EXTRUDE2_REACH, mode=Mode.PRIVATE) - part.part
    add(boss_extrude2_tool1.solids().sort_by_distance((3.00869, 109.4125, -1))[0])

    # Sketch15 → Cut-Extrude8 (cut, up to next)
    with BuildSketch(Plane.ZY, mode=Mode.PRIVATE) as cut_extrude8_sk1:
        with Locations((-25.4, 105)):
            Rectangle(SKETCH15_W, SKETCH15_H)
    cut_extrude8_tool1 = extrude(cut_extrude8_sk1.sketch, amount=-CUT_EXTRUDE8_REACH, mode=Mode.PRIVATE) & part.part
    # Sketch15 → Cut-Extrude8 (cut, up to next)
    with BuildSketch(Plane.ZY, mode=Mode.PRIVATE) as cut_extrude8_sk2:
        with Locations((-25.4, 121.8)):
            Rectangle(SKETCH15_W, SKETCH15_H)
    cut_extrude8_tool2 = extrude(cut_extrude8_sk2.sketch, amount=-CUT_EXTRUDE8_REACH, mode=Mode.PRIVATE) & part.part
    add(cut_extrude8_tool1.solids().sort_by_distance((0, 105, -25.4))[0], mode=Mode.SUBTRACT)
    add(cut_extrude8_tool2.solids().sort_by_distance((0, 121.8, -25.4))[0], mode=Mode.SUBTRACT)

    # Fillet2
    fillet2_edges = [part.edges().sort_by_distance(p)[0] for p in [
        (2, 101.6, -10.4),
        (2, 108.4, -10.4),
        (2, 108.4, -40.4),
        (2, 101.6, -40.4),
        (2, 118.4, -10.4),
        (2, 125.2, -10.4),
        (2, 125.2, -40.4),
        (2, 118.4, -40.4),
    ]]
    fillet(fillet2_edges, radius=FILLET2_R)

    # Sketch20 → Cut-Extrude9 (cut, two sides: drawn at the far end of the back side and taken through both)
    with BuildSketch(Plane(origin=(0, 113.4, 0), x_dir=(1, 0, 0), z_dir=(0, 1, 0)).offset(-CUT_EXTRUDE9_DEPTH_BACK)):
        with Locations((-16.55, 25.4)):
            Circle(SKETCH20_R)
    extrude(amount=CUT_EXTRUDE9_DEPTH + CUT_EXTRUDE9_DEPTH_BACK, mode=Mode.SUBTRACT)


solid = part.part
